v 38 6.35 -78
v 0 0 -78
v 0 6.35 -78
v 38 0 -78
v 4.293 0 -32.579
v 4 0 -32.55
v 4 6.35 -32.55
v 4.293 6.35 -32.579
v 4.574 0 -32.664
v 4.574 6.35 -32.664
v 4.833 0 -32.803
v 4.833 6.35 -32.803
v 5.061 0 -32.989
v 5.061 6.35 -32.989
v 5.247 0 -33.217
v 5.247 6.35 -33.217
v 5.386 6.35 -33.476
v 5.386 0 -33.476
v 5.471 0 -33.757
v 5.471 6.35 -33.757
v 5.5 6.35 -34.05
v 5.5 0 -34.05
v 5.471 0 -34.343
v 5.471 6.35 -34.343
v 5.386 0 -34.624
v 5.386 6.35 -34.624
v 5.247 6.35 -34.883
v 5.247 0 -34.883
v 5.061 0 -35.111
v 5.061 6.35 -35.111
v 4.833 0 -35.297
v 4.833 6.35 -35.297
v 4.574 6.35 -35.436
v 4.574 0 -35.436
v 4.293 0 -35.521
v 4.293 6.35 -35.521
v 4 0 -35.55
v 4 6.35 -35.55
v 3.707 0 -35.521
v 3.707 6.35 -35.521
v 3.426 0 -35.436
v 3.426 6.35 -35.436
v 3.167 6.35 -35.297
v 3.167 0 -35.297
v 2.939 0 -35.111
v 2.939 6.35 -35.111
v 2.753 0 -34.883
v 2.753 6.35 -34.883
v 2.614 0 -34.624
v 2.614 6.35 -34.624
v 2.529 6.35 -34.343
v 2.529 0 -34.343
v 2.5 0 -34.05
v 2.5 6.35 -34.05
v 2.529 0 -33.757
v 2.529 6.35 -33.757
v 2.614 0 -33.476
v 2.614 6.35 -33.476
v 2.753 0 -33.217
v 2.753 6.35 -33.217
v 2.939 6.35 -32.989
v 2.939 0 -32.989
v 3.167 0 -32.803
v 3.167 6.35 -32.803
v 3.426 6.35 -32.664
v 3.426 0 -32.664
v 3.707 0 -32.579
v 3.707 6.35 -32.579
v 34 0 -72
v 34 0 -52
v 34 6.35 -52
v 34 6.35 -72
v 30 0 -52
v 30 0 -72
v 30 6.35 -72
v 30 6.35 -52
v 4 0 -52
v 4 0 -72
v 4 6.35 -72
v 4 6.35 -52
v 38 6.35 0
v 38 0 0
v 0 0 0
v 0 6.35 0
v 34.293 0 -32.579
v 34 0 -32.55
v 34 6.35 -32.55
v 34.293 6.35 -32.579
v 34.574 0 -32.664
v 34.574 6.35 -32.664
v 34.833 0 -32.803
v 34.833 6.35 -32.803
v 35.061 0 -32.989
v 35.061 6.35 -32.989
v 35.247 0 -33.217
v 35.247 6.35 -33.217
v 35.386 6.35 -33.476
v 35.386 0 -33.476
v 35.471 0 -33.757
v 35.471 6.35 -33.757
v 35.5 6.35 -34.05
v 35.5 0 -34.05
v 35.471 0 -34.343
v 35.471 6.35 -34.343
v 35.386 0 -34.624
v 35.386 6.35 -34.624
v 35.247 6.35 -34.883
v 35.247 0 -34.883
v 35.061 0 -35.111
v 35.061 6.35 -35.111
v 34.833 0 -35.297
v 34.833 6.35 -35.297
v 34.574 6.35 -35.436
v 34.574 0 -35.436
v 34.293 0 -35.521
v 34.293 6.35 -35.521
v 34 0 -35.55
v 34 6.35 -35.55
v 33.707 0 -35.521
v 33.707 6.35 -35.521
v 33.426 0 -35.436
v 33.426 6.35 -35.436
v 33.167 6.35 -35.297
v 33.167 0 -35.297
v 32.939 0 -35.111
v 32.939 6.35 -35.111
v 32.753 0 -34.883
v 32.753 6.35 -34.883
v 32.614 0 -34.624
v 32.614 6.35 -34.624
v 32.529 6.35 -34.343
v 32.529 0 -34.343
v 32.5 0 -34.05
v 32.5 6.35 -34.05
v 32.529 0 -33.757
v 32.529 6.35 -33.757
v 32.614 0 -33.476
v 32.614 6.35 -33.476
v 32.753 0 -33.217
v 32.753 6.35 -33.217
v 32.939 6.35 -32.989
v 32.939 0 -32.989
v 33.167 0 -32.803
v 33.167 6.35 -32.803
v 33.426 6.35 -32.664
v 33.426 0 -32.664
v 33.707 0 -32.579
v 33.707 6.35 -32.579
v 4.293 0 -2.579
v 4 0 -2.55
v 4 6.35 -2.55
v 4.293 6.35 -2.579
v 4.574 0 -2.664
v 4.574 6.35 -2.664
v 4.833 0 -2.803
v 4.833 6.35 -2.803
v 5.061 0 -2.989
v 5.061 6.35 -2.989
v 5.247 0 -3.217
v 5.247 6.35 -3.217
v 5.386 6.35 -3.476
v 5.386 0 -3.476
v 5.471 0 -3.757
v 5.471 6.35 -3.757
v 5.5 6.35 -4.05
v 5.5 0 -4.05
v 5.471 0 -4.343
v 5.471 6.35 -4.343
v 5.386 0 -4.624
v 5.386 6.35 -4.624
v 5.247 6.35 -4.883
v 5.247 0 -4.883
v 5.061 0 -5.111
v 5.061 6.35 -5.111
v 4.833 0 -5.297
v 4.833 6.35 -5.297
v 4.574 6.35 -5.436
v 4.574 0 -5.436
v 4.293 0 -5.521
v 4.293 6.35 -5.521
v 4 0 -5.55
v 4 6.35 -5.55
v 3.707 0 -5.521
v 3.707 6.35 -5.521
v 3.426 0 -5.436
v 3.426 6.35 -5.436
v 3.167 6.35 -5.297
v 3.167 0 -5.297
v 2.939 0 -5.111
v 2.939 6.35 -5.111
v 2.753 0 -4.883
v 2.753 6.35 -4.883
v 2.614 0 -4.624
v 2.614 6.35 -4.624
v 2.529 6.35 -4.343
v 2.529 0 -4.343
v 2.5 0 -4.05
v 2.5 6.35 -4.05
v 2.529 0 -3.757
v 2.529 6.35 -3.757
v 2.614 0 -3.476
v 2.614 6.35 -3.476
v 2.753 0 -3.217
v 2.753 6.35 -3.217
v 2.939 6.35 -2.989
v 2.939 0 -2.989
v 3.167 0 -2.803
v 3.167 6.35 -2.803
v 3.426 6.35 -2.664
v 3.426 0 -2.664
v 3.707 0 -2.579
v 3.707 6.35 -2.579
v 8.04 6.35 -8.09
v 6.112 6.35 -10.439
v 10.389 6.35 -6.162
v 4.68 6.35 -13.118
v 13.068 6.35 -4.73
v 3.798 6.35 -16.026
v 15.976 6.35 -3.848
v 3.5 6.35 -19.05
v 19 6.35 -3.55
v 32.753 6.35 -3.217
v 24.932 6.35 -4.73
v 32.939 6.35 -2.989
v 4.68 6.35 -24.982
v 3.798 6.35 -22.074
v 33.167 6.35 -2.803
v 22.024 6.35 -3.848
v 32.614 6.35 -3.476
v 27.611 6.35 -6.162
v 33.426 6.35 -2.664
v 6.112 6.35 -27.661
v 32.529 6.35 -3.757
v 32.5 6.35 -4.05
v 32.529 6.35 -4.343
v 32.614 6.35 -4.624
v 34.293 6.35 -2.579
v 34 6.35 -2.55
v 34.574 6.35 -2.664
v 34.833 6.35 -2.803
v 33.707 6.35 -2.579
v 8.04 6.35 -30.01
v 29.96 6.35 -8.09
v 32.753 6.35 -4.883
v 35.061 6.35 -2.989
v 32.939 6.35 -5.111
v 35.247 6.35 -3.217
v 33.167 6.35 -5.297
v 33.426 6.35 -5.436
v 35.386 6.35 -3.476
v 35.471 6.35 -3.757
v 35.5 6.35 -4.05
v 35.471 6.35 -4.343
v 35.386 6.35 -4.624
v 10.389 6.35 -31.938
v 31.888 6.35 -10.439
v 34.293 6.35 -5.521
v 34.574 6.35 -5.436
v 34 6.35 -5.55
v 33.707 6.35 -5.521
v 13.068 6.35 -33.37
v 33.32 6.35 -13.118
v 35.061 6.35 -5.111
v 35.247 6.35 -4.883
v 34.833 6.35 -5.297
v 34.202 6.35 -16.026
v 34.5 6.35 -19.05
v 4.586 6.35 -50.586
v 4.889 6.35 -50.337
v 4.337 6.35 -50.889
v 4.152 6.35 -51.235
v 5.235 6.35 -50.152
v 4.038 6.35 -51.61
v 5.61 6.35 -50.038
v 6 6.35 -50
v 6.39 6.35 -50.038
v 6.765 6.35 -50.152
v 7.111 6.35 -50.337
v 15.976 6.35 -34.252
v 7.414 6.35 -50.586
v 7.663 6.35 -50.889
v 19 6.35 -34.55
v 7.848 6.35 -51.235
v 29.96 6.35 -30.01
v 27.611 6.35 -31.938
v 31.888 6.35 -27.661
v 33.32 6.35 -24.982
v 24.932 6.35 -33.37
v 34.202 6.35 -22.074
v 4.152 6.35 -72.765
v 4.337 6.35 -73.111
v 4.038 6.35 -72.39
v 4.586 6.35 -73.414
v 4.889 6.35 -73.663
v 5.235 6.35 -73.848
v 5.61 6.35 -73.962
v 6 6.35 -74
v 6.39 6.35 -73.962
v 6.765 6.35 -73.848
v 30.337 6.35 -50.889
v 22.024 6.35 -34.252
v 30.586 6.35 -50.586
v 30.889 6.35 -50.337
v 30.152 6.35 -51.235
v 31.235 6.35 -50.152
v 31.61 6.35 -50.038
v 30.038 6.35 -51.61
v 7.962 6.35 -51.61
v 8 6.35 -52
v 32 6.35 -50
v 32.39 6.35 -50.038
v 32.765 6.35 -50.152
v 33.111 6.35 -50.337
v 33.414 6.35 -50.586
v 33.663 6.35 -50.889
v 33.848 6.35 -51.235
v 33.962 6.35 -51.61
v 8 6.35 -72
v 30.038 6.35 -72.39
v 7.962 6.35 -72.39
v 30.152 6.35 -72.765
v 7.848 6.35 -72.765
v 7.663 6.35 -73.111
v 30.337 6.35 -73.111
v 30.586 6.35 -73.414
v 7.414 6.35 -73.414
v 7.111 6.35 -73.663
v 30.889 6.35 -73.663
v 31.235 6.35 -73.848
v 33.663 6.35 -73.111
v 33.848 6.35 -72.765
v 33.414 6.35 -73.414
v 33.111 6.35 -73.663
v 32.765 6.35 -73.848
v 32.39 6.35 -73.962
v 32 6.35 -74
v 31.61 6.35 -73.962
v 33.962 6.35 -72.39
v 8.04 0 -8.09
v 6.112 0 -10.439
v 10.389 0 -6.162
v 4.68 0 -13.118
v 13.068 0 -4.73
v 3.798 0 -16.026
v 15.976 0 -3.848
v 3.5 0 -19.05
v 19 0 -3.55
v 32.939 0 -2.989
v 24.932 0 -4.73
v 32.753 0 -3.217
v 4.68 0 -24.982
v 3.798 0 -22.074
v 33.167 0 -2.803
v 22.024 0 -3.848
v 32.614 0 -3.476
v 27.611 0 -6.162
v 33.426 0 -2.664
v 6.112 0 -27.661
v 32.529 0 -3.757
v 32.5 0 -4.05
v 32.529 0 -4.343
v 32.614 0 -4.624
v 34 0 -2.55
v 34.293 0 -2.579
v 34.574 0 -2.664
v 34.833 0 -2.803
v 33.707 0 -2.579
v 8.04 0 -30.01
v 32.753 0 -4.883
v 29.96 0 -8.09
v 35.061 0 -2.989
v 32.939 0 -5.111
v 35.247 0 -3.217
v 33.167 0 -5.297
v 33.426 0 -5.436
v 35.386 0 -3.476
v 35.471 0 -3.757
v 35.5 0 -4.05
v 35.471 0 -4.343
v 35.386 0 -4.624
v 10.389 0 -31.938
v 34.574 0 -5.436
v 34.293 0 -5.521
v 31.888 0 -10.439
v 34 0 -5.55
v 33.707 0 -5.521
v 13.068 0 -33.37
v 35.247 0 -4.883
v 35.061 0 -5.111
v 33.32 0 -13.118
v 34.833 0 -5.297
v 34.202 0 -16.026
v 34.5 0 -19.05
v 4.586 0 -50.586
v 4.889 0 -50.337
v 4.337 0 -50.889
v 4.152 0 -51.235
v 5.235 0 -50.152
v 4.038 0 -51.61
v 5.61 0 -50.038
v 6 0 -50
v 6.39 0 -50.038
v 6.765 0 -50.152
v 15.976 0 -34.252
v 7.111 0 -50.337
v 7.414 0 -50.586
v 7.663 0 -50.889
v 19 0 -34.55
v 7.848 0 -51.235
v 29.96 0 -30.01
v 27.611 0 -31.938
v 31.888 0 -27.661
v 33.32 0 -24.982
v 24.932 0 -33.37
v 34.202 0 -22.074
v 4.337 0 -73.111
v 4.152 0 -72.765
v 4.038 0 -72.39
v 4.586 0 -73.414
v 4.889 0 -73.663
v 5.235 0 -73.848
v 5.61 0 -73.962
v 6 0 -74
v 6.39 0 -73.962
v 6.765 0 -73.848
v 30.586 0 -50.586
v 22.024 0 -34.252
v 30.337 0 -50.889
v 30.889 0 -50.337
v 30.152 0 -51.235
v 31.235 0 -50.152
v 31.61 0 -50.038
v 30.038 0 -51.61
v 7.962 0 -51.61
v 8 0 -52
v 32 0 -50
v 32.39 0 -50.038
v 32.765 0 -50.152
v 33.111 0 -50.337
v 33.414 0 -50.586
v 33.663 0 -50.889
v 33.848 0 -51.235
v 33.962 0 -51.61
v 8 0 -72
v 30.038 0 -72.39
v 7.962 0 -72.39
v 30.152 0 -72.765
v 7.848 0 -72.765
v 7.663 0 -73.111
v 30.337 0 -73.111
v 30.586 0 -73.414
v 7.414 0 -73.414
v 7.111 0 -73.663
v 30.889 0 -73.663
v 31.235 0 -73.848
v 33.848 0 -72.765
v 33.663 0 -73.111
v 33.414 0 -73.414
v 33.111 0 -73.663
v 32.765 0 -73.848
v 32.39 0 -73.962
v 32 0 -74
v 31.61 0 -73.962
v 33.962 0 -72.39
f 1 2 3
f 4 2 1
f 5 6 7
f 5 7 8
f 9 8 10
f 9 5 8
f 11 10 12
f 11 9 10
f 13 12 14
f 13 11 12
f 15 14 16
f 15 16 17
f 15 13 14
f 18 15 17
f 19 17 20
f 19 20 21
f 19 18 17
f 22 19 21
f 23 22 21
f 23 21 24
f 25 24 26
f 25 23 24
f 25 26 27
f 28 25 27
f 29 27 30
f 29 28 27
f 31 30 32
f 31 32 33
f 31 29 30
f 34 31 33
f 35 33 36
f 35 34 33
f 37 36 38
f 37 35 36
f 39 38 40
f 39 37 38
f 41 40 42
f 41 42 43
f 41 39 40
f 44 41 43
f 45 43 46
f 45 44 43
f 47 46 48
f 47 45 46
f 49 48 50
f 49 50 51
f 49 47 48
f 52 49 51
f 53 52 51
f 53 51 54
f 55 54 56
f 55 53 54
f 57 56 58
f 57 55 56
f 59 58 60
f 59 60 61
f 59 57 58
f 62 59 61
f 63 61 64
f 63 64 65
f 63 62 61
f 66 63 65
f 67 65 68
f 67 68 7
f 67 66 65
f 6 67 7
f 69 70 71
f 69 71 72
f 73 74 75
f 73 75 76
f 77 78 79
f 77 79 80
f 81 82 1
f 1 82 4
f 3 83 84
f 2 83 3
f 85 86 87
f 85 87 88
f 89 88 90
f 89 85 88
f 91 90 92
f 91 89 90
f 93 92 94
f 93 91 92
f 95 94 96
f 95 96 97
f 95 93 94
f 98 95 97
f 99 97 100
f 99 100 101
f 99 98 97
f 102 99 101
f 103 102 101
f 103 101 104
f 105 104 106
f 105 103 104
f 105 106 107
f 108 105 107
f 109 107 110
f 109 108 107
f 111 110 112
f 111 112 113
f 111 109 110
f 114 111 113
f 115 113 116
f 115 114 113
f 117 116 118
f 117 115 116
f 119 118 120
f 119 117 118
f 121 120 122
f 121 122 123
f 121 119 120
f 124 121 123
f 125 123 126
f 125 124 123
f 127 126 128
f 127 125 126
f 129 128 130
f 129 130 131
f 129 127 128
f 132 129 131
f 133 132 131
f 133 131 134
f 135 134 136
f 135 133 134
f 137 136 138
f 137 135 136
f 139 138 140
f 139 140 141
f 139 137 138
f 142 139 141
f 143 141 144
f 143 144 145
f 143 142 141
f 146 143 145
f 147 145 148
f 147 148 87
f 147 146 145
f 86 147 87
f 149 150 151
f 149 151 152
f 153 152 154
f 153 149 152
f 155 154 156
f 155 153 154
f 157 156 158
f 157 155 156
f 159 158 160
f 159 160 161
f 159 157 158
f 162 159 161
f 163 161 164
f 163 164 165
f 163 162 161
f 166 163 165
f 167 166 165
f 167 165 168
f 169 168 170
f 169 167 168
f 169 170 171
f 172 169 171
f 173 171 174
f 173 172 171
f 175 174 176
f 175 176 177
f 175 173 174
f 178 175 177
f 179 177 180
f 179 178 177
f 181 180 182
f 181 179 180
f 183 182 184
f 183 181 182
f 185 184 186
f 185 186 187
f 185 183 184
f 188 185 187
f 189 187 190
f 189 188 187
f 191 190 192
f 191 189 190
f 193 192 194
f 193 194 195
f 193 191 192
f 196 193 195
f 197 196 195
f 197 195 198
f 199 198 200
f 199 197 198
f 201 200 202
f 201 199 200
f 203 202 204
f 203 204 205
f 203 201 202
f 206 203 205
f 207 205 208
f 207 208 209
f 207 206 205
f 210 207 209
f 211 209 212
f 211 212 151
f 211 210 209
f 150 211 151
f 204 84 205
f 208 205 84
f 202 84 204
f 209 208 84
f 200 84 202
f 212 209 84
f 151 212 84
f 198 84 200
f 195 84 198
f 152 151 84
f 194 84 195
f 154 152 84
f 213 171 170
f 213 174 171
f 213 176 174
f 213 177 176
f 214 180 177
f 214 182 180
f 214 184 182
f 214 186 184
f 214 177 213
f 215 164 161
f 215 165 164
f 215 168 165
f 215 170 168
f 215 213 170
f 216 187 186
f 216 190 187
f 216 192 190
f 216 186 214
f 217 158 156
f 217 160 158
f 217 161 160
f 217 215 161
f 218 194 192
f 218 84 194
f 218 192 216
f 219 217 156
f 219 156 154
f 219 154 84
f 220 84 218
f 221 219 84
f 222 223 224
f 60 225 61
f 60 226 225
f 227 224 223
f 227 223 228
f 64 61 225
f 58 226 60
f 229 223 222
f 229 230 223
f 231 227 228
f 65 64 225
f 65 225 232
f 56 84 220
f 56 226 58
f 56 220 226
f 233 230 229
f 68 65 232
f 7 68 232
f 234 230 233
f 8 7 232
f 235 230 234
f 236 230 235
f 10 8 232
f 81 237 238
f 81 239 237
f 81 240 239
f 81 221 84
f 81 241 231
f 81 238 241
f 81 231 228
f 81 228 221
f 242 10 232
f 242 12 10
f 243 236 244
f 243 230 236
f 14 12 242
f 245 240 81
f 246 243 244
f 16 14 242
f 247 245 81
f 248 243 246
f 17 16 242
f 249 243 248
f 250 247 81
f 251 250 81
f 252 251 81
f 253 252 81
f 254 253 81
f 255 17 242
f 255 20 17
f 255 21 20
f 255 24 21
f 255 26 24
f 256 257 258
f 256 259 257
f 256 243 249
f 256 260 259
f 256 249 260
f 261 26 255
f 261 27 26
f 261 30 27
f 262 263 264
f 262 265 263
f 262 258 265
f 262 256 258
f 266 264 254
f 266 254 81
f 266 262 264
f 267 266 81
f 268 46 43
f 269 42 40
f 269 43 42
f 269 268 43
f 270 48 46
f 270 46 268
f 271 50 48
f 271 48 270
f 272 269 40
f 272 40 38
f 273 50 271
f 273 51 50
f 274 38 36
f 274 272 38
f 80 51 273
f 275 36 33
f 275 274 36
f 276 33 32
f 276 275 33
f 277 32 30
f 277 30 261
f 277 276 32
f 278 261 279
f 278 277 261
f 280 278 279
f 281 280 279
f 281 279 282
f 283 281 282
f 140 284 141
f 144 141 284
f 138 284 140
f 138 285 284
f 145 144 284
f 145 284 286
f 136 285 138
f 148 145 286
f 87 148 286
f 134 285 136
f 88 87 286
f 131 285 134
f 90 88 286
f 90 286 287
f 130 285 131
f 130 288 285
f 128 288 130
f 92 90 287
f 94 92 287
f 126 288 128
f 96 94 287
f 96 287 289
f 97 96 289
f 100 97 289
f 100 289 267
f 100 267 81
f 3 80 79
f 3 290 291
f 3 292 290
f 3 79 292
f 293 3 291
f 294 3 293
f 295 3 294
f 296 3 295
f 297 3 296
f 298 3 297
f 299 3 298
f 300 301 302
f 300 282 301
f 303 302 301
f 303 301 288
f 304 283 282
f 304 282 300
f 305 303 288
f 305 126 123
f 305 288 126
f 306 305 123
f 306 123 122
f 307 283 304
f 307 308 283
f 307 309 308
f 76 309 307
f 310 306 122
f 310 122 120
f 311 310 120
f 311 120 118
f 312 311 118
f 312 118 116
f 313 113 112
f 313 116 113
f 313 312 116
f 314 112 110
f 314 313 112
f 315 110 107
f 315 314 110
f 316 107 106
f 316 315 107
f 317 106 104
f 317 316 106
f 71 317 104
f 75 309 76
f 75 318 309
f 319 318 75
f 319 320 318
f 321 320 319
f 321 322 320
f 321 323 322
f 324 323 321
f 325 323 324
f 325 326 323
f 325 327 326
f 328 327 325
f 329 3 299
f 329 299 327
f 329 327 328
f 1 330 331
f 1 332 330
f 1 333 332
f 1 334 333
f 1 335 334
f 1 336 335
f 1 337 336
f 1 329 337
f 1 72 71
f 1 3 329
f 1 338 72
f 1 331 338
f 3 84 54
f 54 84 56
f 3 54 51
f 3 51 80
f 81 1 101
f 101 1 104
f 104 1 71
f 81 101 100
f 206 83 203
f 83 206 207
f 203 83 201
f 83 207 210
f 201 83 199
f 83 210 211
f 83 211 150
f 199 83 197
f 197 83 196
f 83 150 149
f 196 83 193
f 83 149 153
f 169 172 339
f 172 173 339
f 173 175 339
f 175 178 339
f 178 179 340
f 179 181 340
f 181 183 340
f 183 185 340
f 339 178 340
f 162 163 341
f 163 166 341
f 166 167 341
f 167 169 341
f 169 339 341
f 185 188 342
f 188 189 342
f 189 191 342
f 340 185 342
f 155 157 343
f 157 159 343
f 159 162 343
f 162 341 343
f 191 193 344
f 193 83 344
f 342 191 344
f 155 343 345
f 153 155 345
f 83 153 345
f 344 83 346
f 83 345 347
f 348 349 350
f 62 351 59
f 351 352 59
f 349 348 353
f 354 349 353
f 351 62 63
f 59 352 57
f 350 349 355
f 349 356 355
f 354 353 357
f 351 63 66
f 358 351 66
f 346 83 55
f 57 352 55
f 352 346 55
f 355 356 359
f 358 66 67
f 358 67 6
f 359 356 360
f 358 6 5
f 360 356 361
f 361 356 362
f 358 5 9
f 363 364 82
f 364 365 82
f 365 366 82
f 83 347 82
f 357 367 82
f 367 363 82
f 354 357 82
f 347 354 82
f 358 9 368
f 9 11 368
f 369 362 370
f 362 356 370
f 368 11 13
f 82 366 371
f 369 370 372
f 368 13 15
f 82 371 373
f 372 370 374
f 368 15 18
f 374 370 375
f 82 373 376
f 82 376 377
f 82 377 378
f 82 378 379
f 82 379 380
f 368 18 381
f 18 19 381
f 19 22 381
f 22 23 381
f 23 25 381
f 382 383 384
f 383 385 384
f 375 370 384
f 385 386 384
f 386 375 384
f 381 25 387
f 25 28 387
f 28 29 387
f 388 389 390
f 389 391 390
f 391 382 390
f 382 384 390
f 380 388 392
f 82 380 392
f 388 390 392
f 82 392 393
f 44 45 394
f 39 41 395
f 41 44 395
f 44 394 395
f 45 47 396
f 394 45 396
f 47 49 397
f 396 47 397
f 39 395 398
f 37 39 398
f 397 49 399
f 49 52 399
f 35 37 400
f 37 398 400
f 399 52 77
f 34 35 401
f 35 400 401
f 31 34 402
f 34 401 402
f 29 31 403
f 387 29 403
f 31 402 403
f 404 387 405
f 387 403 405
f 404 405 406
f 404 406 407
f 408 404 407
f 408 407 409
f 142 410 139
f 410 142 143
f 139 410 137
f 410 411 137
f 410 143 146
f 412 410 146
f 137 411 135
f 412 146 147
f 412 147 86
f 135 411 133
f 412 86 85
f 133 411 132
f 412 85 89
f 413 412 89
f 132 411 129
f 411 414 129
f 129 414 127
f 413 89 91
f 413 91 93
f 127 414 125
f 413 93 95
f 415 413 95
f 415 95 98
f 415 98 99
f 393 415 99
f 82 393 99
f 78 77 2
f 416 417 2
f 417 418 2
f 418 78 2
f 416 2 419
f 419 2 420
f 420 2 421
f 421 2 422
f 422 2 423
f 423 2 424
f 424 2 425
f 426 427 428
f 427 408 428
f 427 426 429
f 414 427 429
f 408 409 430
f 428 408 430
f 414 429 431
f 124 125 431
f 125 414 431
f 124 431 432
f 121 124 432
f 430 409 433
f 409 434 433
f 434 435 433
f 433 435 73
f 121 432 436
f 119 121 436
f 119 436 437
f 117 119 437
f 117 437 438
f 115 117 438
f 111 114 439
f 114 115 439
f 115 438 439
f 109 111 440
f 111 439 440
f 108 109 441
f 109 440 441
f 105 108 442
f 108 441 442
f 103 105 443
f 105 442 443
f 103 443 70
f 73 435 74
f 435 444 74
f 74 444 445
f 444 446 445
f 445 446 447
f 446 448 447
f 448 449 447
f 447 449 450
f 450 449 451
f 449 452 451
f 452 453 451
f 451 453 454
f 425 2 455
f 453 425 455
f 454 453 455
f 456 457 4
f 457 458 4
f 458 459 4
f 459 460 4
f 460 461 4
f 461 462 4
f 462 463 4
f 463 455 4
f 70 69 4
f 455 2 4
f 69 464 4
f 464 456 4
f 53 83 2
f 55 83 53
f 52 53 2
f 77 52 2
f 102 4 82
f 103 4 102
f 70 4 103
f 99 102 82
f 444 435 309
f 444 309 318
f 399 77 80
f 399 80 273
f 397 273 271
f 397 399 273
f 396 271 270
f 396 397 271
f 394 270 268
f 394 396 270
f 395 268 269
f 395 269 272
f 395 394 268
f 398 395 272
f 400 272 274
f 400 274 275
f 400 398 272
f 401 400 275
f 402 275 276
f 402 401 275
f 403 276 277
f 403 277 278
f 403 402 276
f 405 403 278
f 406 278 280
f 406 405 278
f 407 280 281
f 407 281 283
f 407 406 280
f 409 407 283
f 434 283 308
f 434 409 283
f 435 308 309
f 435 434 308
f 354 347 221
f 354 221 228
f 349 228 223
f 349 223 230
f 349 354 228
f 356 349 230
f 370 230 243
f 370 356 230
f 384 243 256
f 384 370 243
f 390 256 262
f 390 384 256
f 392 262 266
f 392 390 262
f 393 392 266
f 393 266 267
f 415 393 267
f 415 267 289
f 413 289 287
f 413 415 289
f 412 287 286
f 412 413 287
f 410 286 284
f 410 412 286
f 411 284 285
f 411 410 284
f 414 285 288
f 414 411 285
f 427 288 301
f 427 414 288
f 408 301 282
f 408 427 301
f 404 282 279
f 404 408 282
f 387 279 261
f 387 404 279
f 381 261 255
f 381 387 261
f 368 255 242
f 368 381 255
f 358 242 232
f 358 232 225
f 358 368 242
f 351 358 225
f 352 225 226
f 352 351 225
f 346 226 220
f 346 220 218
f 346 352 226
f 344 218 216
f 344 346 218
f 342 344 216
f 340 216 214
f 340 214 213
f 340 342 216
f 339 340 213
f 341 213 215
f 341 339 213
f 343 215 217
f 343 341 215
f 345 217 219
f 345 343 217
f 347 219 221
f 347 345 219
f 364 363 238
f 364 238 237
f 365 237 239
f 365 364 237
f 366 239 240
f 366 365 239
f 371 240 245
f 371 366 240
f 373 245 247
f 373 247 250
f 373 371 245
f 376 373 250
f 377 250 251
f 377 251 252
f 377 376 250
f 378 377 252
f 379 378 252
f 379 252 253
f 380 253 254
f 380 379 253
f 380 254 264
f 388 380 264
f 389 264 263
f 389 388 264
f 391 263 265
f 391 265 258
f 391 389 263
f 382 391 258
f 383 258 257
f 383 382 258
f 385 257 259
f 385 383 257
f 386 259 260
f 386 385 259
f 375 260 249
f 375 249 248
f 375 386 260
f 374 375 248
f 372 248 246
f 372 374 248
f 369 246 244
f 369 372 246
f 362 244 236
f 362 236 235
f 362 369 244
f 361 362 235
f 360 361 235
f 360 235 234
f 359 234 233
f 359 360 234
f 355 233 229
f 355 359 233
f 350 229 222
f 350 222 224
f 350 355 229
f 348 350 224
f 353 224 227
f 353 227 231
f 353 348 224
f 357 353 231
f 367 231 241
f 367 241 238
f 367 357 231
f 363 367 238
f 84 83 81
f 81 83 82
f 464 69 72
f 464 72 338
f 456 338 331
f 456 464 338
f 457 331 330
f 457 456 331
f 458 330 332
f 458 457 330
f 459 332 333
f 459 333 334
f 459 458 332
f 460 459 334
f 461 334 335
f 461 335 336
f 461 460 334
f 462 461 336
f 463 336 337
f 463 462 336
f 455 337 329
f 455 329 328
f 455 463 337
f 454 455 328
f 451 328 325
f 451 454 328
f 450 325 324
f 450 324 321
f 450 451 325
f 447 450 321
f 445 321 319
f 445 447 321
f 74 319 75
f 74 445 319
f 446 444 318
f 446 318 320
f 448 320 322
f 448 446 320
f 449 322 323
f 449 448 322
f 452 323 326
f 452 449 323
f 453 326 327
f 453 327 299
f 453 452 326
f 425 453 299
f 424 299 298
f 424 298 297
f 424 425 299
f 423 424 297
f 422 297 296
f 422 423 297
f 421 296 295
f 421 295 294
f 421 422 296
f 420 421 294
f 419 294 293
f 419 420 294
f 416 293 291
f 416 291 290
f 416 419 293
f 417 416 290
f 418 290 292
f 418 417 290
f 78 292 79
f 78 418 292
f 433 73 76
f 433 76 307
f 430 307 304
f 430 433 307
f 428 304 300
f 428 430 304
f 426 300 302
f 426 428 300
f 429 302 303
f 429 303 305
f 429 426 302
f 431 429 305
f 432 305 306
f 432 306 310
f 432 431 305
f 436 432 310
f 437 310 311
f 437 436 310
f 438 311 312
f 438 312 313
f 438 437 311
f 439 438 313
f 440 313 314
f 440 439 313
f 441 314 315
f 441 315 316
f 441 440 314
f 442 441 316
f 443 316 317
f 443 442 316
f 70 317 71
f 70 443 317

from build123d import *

# Parameters (mm, degrees)
SKETCH1_W           = 38
SKETCH1_H           = 78
SKETCH1_R           = 1.5
SKETCH1_R_2         = 15.5
BOSS_EXTRUDE1_DEPTH = 6.35


with BuildPart() as part:
    # Sketch1 → Boss-Extrude1 (new body)
    with BuildSketch(Plane(origin=(0, 0, 0), x_dir=(1, 0, 0), z_dir=(0, 1, 0))):
        with Locations((19, 39)):
            Rectangle(SKETCH1_W, SKETCH1_H)
        with Locations(Location((4, 4.05, 0), (0, 0, 270))):
            Circle(SKETCH1_R, mode=Mode.SUBTRACT)
        with Locations(Location((34, 4.05, 0), (0, 0, 270))):
            Circle(SKETCH1_R, mode=Mode.SUBTRACT)
        with Locations(Location((34, 34.05, 0), (0, 0, 270))):
            Circle(SKETCH1_R, mode=Mode.SUBTRACT)
        with Locations(Location((4, 34.05, 0), (0, 0, 270))):
            Circle(SKETCH1_R, mode=Mode.SUBTRACT)
        with Locations(Location((19, 19.05, 0), (0, 0, 270))):
            Circle(SKETCH1_R_2, mode=Mode.SUBTRACT)
        with BuildLine():
            Line((4, 72), (4, 52))
            ThreePointArc((4, 52), (6, 50), (8, 52))
            Line((8, 52), (8, 72))
            ThreePointArc((8, 72), (6, 74), (4, 72))
        make_face(mode=Mode.SUBTRACT)
        with BuildLine():
            Line((30, 72), (30, 52))
            ThreePointArc((30, 52), (32, 50), (34, 52))
            Line((34, 52), (34, 72))
            ThreePointArc((34, 72), (32, 74), (30, 72))
        make_face(mode=Mode.SUBTRACT)
    extrude(amount=BOSS_EXTRUDE1_DEPTH)


solid = part.part
